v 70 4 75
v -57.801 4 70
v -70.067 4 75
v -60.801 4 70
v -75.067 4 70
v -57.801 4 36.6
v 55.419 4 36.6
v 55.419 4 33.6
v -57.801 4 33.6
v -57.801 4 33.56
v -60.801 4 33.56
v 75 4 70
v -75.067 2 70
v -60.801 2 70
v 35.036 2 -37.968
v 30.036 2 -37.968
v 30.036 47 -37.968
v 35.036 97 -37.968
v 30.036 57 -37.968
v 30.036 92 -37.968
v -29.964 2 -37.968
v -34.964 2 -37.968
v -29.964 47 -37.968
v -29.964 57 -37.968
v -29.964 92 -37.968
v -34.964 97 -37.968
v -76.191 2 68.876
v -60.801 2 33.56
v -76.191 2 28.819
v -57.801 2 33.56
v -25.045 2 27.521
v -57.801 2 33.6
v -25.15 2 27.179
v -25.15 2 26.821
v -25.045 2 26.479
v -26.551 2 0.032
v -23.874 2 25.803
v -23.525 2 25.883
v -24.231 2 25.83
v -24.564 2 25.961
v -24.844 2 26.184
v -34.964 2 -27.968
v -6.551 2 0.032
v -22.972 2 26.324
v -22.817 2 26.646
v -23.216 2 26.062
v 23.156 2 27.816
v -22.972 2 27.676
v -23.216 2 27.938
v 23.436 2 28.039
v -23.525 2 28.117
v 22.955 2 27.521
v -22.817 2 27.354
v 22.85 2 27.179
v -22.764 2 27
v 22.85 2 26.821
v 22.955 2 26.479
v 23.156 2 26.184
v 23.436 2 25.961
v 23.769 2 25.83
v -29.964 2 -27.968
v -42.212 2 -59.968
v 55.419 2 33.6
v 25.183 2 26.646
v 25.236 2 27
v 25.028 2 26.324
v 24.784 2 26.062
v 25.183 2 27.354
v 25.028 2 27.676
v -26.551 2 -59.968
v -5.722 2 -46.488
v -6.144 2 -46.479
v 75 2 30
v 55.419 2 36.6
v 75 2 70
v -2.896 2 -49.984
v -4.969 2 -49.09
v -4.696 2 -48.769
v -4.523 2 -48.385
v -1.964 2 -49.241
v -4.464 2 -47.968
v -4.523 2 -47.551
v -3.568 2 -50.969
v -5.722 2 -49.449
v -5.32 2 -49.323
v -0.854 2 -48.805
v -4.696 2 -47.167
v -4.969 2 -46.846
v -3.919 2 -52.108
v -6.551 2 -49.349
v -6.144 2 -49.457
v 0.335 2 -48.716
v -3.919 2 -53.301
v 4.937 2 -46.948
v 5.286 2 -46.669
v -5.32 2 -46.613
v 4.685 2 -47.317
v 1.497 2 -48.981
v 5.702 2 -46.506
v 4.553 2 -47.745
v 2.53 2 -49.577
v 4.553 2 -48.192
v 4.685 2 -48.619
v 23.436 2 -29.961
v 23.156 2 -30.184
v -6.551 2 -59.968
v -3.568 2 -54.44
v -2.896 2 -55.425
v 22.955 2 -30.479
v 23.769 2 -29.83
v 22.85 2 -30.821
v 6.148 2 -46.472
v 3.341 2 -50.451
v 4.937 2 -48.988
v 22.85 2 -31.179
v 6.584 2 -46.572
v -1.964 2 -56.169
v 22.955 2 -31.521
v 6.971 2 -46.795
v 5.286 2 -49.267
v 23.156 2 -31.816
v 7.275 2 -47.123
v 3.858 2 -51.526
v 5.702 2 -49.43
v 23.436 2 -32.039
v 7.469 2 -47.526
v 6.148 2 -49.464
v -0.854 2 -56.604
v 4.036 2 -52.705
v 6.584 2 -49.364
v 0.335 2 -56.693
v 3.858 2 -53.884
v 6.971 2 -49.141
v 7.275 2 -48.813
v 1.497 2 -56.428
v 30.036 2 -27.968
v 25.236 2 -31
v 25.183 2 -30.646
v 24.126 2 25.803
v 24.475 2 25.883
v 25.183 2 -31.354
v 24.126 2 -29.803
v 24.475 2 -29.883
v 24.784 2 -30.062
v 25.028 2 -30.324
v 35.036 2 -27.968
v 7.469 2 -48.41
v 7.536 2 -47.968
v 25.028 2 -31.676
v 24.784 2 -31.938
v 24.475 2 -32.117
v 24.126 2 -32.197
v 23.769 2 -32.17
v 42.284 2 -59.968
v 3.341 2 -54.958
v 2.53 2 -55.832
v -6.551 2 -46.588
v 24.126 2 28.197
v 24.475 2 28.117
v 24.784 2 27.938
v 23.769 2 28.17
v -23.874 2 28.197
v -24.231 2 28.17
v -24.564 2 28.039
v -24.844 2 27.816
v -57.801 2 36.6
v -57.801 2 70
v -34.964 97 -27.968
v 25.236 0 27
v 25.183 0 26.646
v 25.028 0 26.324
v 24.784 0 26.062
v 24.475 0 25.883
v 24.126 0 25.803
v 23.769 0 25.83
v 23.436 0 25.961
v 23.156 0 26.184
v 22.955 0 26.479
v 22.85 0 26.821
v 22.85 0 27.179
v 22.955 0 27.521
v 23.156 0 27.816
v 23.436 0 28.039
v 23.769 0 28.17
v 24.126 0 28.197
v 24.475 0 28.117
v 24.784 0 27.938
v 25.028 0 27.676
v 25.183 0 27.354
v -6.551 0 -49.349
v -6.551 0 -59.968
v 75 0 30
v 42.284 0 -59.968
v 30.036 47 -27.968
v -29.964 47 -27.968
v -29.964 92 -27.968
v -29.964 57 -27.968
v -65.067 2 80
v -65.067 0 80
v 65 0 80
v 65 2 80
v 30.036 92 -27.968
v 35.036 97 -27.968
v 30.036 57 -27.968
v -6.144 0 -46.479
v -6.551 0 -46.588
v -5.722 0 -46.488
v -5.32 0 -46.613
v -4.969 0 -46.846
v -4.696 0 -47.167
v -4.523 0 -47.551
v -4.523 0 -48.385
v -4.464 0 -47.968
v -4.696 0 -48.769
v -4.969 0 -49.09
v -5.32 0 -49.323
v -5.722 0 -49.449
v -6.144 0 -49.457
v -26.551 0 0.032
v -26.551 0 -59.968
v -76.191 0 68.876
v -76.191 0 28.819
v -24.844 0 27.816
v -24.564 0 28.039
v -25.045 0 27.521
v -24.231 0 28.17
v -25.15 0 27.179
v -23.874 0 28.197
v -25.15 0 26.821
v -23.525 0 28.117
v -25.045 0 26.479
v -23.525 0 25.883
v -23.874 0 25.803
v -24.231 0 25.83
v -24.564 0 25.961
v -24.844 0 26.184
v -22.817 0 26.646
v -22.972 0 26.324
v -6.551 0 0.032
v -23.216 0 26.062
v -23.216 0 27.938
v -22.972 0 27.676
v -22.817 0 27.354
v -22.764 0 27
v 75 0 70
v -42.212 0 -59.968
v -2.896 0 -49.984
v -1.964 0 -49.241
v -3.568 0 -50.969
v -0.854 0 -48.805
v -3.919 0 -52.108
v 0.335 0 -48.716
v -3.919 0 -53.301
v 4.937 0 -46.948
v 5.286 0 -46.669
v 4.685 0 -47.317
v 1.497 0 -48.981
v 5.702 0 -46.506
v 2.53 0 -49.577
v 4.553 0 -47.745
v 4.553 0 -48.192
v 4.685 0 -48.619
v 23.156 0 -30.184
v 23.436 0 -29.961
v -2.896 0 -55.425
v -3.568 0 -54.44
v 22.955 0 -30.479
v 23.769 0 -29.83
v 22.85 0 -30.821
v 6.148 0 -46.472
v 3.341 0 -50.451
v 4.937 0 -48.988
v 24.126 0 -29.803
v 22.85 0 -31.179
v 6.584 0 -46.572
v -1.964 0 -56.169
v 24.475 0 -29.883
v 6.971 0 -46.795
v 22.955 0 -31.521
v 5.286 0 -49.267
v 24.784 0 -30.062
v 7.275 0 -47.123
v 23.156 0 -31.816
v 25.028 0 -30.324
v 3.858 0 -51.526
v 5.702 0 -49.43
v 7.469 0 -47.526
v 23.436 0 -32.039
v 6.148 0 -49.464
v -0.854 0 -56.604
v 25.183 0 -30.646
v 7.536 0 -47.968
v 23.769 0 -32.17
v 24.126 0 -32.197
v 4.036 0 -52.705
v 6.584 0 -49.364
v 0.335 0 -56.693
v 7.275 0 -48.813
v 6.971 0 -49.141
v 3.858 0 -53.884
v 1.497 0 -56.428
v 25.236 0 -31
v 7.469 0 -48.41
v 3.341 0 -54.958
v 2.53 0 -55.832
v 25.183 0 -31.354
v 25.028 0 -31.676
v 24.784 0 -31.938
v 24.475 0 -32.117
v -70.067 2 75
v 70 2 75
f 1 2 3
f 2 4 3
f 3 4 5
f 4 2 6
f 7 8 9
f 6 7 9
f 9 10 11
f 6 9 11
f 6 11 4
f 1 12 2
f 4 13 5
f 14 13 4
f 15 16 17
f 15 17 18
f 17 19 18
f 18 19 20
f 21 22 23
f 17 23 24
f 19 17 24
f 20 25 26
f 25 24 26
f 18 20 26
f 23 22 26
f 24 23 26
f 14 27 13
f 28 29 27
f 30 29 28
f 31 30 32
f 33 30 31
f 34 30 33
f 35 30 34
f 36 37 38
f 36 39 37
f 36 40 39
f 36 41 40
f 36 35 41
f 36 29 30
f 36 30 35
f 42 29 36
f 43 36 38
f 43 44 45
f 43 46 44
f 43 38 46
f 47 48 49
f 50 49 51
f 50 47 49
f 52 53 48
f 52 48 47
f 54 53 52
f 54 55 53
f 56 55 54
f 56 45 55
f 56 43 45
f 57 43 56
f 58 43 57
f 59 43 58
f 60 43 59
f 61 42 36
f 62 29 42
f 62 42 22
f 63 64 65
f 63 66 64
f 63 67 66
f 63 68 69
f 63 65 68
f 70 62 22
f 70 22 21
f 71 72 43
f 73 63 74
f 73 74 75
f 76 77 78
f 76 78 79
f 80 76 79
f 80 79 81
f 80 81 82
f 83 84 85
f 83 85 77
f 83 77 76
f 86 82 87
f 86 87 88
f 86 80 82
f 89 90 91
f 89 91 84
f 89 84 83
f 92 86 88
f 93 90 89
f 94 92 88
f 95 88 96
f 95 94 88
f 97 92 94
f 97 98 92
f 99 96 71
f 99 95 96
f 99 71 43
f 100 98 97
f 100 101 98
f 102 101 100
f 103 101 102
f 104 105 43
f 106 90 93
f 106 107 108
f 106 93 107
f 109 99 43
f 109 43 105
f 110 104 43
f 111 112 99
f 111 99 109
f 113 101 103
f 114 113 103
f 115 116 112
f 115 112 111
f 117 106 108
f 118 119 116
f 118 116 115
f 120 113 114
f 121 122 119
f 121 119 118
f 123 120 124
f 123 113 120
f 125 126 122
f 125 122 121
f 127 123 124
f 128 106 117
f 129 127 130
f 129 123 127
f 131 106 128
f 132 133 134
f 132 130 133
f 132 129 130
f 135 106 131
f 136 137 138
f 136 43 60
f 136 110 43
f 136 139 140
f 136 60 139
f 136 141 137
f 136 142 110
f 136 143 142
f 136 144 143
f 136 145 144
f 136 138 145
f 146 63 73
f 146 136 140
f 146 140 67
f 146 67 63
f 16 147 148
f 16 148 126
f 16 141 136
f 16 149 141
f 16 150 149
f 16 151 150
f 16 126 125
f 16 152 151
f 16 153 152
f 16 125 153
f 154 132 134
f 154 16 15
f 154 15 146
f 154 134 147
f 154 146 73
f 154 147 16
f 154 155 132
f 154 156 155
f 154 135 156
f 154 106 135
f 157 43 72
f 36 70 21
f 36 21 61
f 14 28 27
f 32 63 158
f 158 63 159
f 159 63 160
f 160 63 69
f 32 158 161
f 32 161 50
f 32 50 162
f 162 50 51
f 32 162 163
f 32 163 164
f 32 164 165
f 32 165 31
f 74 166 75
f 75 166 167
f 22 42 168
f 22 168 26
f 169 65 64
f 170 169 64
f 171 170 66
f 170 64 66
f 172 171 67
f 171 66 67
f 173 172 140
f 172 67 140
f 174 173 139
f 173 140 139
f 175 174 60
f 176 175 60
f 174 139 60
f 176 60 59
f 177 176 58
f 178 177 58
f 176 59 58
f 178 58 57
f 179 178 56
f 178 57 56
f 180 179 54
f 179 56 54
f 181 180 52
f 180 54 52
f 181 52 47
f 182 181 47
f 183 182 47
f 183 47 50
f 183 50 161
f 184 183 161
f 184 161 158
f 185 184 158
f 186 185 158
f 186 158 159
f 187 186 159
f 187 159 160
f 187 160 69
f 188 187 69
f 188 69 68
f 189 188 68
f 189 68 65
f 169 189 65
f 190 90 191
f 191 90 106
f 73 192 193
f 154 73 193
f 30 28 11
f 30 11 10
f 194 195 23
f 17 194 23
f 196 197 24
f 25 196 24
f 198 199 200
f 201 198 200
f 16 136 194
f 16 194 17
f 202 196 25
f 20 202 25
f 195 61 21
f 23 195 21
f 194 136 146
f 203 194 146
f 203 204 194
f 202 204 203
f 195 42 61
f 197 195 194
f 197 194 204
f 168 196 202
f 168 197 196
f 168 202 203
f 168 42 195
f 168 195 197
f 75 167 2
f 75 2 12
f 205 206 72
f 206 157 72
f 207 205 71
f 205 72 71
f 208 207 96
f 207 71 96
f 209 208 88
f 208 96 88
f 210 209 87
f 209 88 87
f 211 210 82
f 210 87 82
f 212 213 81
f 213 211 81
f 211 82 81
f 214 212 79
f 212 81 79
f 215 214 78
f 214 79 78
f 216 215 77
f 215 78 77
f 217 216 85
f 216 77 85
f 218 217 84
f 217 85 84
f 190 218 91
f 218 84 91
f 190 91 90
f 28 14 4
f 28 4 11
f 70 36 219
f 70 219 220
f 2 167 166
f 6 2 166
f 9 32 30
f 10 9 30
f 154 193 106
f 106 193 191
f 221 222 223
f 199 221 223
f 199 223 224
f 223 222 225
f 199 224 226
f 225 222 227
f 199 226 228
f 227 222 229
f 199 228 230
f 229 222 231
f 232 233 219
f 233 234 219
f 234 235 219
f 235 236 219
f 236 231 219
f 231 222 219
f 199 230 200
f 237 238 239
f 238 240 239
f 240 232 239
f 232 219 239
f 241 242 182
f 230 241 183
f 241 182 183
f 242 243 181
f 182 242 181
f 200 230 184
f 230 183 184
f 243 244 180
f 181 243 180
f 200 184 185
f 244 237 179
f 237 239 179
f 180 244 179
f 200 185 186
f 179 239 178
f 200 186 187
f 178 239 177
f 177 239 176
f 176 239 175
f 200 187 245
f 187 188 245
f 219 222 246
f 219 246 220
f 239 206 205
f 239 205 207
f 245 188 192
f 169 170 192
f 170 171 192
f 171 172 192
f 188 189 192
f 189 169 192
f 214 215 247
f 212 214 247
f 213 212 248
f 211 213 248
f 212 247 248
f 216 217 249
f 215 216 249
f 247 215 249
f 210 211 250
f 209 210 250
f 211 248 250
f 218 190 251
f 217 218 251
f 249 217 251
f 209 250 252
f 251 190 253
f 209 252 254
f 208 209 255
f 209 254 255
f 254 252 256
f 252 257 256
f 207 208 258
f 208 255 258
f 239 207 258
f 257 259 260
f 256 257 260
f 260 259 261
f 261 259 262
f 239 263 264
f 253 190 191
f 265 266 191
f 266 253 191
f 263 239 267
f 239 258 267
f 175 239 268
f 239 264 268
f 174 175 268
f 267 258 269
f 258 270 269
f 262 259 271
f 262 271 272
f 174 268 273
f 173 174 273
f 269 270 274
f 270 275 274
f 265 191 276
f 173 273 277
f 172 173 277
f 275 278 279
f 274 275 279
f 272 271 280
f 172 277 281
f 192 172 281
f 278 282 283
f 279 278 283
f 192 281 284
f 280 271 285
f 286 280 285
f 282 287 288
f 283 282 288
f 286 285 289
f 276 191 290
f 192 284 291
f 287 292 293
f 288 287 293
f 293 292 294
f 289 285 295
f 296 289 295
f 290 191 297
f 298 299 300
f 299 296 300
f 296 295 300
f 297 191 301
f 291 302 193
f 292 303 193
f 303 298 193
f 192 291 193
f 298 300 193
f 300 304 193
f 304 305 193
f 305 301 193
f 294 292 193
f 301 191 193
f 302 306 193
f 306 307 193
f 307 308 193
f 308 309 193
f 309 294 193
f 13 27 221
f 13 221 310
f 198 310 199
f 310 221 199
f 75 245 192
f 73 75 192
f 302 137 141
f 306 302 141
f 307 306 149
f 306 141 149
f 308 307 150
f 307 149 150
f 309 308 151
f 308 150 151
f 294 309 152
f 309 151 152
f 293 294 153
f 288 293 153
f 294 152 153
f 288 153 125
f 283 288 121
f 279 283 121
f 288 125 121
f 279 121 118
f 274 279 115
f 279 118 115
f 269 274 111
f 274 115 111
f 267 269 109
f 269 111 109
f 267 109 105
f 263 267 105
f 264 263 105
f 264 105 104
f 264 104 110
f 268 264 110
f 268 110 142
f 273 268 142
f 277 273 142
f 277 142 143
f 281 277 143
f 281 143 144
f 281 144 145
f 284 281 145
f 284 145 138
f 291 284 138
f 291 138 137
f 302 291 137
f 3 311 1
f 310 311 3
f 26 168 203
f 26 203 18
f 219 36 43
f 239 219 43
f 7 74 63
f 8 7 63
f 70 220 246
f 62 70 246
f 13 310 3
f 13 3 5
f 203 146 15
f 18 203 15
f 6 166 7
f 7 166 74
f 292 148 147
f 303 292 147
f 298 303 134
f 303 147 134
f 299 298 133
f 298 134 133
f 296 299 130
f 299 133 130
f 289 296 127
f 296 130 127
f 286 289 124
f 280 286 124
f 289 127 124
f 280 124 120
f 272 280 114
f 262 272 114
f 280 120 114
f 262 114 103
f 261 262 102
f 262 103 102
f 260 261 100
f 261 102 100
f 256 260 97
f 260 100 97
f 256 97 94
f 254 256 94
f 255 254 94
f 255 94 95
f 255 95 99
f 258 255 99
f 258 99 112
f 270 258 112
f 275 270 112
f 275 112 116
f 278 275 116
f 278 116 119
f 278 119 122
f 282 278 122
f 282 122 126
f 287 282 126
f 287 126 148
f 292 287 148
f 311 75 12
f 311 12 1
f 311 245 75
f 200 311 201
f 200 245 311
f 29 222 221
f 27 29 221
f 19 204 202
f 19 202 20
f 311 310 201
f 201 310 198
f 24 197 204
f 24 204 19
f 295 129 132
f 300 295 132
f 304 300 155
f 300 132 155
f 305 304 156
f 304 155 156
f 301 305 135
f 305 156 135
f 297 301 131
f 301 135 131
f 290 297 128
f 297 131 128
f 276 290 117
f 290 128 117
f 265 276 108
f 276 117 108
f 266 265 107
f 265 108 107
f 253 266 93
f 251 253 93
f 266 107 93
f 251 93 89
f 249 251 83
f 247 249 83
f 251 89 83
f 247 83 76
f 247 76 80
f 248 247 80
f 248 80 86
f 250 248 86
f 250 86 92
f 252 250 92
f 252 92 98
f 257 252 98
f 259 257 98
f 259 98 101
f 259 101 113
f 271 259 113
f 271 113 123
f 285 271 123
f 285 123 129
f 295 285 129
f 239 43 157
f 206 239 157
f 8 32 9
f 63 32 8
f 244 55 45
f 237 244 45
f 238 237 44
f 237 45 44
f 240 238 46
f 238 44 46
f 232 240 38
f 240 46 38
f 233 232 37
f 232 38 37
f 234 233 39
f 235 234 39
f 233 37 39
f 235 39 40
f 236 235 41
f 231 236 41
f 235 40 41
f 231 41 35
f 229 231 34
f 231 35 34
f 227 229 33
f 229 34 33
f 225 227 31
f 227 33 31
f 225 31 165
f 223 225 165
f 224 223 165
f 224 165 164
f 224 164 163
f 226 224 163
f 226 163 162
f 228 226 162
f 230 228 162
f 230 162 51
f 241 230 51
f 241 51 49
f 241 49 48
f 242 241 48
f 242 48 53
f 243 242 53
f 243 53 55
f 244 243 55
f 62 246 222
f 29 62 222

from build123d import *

# Parameters (mm, degrees)
BOSS_EXTRUDE1_DEPTH = 2
BOSS_EXTRUDE2_DEPTH = 2
SKETCH4_W           = 3
SKETCH4_H           = 36.44
BOSS_EXTRUDE3_DEPTH = 2
SKETCH5_W           = 113.22
SKETCH5_H           = 3
BOSS_EXTRUDE4_DEPTH = 2
CUT_EXTRUDE1_REACH  = 4
SKETCH6_R           = 1.2
CUT_EXTRUDE2_REACH  = 4
SKETCH10_R          = 1.5
SKETCH11_W          = 5
SKETCH11_H          = 10
BOSS_EXTRUDE6_DEPTH = 95
SKETCH12_W          = 10
SKETCH12_H          = 5
BOSS_EXTRUDE7_DEPTH = 60
CUT_EXTRUDE3_REACH  = 99
SKETCH13_R          = 4
SKETCH14_W          = 10
SKETCH14_H          = 10
BOSS_EXTRUDE8_DEPTH = 60
CUT_EXTRUDE4_REACH  = 4
SKETCH16_W          = 20
SKETCH16_H          = 60


with BuildPart() as part:
    # Sketch1 → Boss-Extrude1 (new body)
    with BuildSketch(Plane(origin=(0, 0, 0), x_dir=(1, 0, 0), z_dir=(0, 1, 0))):
        Polygon((-76.190879746, -68.876090608), (-65.066970355, -80), (65, -80), (75, -70), (75, -30), (42.284331493, 59.968088394), (-42.212099054, 59.968088394), (-76.190879746, -28.818652669), align=None)
    extrude(amount=BOSS_EXTRUDE1_DEPTH)

    # Sketch2 → Boss-Extrude2 (add)
    with BuildSketch(Plane(origin=(0, 2, 0), x_dir=(1, 0, 0), z_dir=(0, 1, 0))):
        Polygon((-75.066970355, -70), (75, -70), (70, -75), (-70.066970355, -75), align=None)
    extrude(amount=BOSS_EXTRUDE2_DEPTH)

    # Sketch4 → Boss-Extrude3 (add)
    with BuildSketch(Plane(origin=(0, 2, 0), x_dir=(1, 0, 0), z_dir=(0, 1, 0))):
        with Locations((-59.300879746, -51.78)):
            Rectangle(SKETCH4_W, SKETCH4_H)
    extrude(amount=BOSS_EXTRUDE3_DEPTH)

    # Sketch5 → Boss-Extrude4 (add)
    with BuildSketch(Plane(origin=(0, 2, 0), x_dir=(1, 0, 0), z_dir=(0, 1, 0))):
        with Locations((-1.190879746, -35.1)):
            Rectangle(SKETCH5_W, SKETCH5_H)
    extrude(amount=BOSS_EXTRUDE4_DEPTH)

    # Sketch6 → Cut-Extrude1 (cut, up to next)
    with BuildSketch(Plane(origin=(0, 2, 0), x_dir=(1, 0, 0), z_dir=(0, 1, 0)), mode=Mode.PRIVATE) as cut_extrude1_sk1:
        with Locations((-23.96388378, 31)):
            Circle(SKETCH6_R)
    cut_extrude1_tool1 = extrude(cut_extrude1_sk1.sketch, amount=-CUT_EXTRUDE1_REACH, mode=Mode.PRIVATE) & part.part
    add(cut_extrude1_tool1.solids().sort_by_distance((-23.963884, 2, -31))[0], mode=Mode.SUBTRACT)
    # Sketch6 → Cut-Extrude1 (cut, up to next)
    with BuildSketch(Plane(origin=(0, 2, 0), x_dir=(1, 0, 0), z_dir=(0, 1, 0)), mode=Mode.PRIVATE) as cut_extrude1_sk2:
        with Locations((24.03611622, 31)):
            Circle(SKETCH6_R)
    cut_extrude1_tool2 = extrude(cut_extrude1_sk2.sketch, amount=-CUT_EXTRUDE1_REACH, mode=Mode.PRIVATE) & part.part
    add(cut_extrude1_tool2.solids().sort_by_distance((24.036116, 2, -31))[0], mode=Mode.SUBTRACT)
    # Sketch6 → Cut-Extrude1 (cut, up to next)
    with BuildSketch(Plane(origin=(0, 2, 0), x_dir=(1, 0, 0), z_dir=(0, 1, 0)), mode=Mode.PRIVATE) as cut_extrude1_sk3:
        with Locations((-23.96388378, -27)):
            Circle(SKETCH6_R)
    cut_extrude1_tool3 = extrude(cut_extrude1_sk3.sketch, amount=-CUT_EXTRUDE1_REACH, mode=Mode.PRIVATE) & part.part
    add(cut_extrude1_tool3.solids().sort_by_distance((-23.963884, 2, 27))[0], mode=Mode.SUBTRACT)
    # Sketch6 → Cut-Extrude1 (cut, up to next)
    with BuildSketch(Plane(origin=(0, 2, 0), x_dir=(1, 0, 0), z_dir=(0, 1, 0)), mode=Mode.PRIVATE) as cut_extrude1_sk4:
        with Locations((24.03611622, -27)):
            Circle(SKETCH6_R)
    cut_extrude1_tool4 = extrude(cut_extrude1_sk4.sketch, amount=-CUT_EXTRUDE1_REACH, mode=Mode.PRIVATE) & part.part
    add(cut_extrude1_tool4.solids().sort_by_distance((24.036116, 2, 27))[0], mode=Mode.SUBTRACT)

    # Sketch10 → Cut-Extrude2 (cut, up to next)
    with BuildSketch(Plane(origin=(0, 2, 0), x_dir=(1, 0, 0), z_dir=(0, 1, 0)), mode=Mode.PRIVATE) as cut_extrude2_sk1:
        with Locations((-5.96388378, 47.968088394)):
            Circle(SKETCH10_R)
    cut_extrude2_tool1 = extrude(cut_extrude2_sk1.sketch, amount=-CUT_EXTRUDE2_REACH, mode=Mode.PRIVATE) & part.part
    add(cut_extrude2_tool1.solids().sort_by_distance((-5.963884, 2, -47.968088))[0], mode=Mode.SUBTRACT)
    # Sketch10 → Cut-Extrude2 (cut, up to next)
    with BuildSketch(Plane(origin=(0, 2, 0), x_dir=(1, 0, 0), z_dir=(0, 1, 0)), mode=Mode.PRIVATE) as cut_extrude2_sk2:
        with Locations((6.03611622, 47.968088394)):
            Circle(SKETCH10_R)
    cut_extrude2_tool2 = extrude(cut_extrude2_sk2.sketch, amount=-CUT_EXTRUDE2_REACH, mode=Mode.PRIVATE) & part.part
    add(cut_extrude2_tool2.solids().sort_by_distance((6.036116, 2, -47.968088))[0], mode=Mode.SUBTRACT)

    # Sketch11 → Boss-Extrude6 (add)
    with BuildSketch(Plane(origin=(0, 2, 0), x_dir=(1, 0, 0), z_dir=(0, 1, 0))):
        with Locations((-32.46388378, 32.968088394)):
            Rectangle(SKETCH11_W, SKETCH11_H)
        with Locations((32.53611622, 32.968088394)):
            Rectangle(SKETCH11_W, SKETCH11_H)
    extrude(amount=BOSS_EXTRUDE6_DEPTH)

    # Sketch12 → Boss-Extrude7 (add)
    with BuildSketch(Plane(origin=(-29.96388378, 0, 0), x_dir=(0, 0, -1), z_dir=(1, 0, 0))):
        with Locations((32.968088394, 94.5)):
            Rectangle(SKETCH12_W, SKETCH12_H)
    extrude(amount=BOSS_EXTRUDE7_DEPTH)

    # Sketch13 → Cut-Extrude3 (cut, up to next)
    with BuildSketch(Plane(origin=(0, 97, 0), x_dir=(1, 0, 0), z_dir=(0, 1, 0)), mode=Mode.PRIVATE) as cut_extrude3_sk1:
        with Locations((0.03611622, 52.704663647)):
            Circle(SKETCH13_R)
    cut_extrude3_tool1 = extrude(cut_extrude3_sk1.sketch, amount=-CUT_EXTRUDE3_REACH, mode=Mode.PRIVATE) & part.part
    add(cut_extrude3_tool1.solids().sort_by_distance((0.036116, 97, -52.704664))[0], mode=Mode.SUBTRACT)

    # Sketch14 → Boss-Extrude8 (add)
    with BuildSketch(Plane(origin=(-29.96388378, 0, 0), x_dir=(0, 0, -1), z_dir=(1, 0, 0))):
        with Locations((32.968088394, 52)):
            Rectangle(SKETCH14_W, SKETCH14_H)
    extrude(amount=BOSS_EXTRUDE8_DEPTH)

    # Sketch16 → Cut-Extrude4 (cut, up to next)
    with BuildSketch(Plane(origin=(0, 2, 0), x_dir=(1, 0, 0), z_dir=(0, 1, 0)), mode=Mode.PRIVATE) as cut_extrude4_sk1:
        with Locations((-16.550598938, 29.968088394)):
            Rectangle(SKETCH16_W, SKETCH16_H)
    cut_extrude4_tool1 = extrude(cut_extrude4_sk1.sketch, amount=-CUT_EXTRUDE4_REACH, mode=Mode.PRIVATE) & part.part
    add(cut_extrude4_tool1.solids().sort_by_distance((-16.550599, 2, -29.968088))[0], mode=Mode.SUBTRACT)


solid = part.part
